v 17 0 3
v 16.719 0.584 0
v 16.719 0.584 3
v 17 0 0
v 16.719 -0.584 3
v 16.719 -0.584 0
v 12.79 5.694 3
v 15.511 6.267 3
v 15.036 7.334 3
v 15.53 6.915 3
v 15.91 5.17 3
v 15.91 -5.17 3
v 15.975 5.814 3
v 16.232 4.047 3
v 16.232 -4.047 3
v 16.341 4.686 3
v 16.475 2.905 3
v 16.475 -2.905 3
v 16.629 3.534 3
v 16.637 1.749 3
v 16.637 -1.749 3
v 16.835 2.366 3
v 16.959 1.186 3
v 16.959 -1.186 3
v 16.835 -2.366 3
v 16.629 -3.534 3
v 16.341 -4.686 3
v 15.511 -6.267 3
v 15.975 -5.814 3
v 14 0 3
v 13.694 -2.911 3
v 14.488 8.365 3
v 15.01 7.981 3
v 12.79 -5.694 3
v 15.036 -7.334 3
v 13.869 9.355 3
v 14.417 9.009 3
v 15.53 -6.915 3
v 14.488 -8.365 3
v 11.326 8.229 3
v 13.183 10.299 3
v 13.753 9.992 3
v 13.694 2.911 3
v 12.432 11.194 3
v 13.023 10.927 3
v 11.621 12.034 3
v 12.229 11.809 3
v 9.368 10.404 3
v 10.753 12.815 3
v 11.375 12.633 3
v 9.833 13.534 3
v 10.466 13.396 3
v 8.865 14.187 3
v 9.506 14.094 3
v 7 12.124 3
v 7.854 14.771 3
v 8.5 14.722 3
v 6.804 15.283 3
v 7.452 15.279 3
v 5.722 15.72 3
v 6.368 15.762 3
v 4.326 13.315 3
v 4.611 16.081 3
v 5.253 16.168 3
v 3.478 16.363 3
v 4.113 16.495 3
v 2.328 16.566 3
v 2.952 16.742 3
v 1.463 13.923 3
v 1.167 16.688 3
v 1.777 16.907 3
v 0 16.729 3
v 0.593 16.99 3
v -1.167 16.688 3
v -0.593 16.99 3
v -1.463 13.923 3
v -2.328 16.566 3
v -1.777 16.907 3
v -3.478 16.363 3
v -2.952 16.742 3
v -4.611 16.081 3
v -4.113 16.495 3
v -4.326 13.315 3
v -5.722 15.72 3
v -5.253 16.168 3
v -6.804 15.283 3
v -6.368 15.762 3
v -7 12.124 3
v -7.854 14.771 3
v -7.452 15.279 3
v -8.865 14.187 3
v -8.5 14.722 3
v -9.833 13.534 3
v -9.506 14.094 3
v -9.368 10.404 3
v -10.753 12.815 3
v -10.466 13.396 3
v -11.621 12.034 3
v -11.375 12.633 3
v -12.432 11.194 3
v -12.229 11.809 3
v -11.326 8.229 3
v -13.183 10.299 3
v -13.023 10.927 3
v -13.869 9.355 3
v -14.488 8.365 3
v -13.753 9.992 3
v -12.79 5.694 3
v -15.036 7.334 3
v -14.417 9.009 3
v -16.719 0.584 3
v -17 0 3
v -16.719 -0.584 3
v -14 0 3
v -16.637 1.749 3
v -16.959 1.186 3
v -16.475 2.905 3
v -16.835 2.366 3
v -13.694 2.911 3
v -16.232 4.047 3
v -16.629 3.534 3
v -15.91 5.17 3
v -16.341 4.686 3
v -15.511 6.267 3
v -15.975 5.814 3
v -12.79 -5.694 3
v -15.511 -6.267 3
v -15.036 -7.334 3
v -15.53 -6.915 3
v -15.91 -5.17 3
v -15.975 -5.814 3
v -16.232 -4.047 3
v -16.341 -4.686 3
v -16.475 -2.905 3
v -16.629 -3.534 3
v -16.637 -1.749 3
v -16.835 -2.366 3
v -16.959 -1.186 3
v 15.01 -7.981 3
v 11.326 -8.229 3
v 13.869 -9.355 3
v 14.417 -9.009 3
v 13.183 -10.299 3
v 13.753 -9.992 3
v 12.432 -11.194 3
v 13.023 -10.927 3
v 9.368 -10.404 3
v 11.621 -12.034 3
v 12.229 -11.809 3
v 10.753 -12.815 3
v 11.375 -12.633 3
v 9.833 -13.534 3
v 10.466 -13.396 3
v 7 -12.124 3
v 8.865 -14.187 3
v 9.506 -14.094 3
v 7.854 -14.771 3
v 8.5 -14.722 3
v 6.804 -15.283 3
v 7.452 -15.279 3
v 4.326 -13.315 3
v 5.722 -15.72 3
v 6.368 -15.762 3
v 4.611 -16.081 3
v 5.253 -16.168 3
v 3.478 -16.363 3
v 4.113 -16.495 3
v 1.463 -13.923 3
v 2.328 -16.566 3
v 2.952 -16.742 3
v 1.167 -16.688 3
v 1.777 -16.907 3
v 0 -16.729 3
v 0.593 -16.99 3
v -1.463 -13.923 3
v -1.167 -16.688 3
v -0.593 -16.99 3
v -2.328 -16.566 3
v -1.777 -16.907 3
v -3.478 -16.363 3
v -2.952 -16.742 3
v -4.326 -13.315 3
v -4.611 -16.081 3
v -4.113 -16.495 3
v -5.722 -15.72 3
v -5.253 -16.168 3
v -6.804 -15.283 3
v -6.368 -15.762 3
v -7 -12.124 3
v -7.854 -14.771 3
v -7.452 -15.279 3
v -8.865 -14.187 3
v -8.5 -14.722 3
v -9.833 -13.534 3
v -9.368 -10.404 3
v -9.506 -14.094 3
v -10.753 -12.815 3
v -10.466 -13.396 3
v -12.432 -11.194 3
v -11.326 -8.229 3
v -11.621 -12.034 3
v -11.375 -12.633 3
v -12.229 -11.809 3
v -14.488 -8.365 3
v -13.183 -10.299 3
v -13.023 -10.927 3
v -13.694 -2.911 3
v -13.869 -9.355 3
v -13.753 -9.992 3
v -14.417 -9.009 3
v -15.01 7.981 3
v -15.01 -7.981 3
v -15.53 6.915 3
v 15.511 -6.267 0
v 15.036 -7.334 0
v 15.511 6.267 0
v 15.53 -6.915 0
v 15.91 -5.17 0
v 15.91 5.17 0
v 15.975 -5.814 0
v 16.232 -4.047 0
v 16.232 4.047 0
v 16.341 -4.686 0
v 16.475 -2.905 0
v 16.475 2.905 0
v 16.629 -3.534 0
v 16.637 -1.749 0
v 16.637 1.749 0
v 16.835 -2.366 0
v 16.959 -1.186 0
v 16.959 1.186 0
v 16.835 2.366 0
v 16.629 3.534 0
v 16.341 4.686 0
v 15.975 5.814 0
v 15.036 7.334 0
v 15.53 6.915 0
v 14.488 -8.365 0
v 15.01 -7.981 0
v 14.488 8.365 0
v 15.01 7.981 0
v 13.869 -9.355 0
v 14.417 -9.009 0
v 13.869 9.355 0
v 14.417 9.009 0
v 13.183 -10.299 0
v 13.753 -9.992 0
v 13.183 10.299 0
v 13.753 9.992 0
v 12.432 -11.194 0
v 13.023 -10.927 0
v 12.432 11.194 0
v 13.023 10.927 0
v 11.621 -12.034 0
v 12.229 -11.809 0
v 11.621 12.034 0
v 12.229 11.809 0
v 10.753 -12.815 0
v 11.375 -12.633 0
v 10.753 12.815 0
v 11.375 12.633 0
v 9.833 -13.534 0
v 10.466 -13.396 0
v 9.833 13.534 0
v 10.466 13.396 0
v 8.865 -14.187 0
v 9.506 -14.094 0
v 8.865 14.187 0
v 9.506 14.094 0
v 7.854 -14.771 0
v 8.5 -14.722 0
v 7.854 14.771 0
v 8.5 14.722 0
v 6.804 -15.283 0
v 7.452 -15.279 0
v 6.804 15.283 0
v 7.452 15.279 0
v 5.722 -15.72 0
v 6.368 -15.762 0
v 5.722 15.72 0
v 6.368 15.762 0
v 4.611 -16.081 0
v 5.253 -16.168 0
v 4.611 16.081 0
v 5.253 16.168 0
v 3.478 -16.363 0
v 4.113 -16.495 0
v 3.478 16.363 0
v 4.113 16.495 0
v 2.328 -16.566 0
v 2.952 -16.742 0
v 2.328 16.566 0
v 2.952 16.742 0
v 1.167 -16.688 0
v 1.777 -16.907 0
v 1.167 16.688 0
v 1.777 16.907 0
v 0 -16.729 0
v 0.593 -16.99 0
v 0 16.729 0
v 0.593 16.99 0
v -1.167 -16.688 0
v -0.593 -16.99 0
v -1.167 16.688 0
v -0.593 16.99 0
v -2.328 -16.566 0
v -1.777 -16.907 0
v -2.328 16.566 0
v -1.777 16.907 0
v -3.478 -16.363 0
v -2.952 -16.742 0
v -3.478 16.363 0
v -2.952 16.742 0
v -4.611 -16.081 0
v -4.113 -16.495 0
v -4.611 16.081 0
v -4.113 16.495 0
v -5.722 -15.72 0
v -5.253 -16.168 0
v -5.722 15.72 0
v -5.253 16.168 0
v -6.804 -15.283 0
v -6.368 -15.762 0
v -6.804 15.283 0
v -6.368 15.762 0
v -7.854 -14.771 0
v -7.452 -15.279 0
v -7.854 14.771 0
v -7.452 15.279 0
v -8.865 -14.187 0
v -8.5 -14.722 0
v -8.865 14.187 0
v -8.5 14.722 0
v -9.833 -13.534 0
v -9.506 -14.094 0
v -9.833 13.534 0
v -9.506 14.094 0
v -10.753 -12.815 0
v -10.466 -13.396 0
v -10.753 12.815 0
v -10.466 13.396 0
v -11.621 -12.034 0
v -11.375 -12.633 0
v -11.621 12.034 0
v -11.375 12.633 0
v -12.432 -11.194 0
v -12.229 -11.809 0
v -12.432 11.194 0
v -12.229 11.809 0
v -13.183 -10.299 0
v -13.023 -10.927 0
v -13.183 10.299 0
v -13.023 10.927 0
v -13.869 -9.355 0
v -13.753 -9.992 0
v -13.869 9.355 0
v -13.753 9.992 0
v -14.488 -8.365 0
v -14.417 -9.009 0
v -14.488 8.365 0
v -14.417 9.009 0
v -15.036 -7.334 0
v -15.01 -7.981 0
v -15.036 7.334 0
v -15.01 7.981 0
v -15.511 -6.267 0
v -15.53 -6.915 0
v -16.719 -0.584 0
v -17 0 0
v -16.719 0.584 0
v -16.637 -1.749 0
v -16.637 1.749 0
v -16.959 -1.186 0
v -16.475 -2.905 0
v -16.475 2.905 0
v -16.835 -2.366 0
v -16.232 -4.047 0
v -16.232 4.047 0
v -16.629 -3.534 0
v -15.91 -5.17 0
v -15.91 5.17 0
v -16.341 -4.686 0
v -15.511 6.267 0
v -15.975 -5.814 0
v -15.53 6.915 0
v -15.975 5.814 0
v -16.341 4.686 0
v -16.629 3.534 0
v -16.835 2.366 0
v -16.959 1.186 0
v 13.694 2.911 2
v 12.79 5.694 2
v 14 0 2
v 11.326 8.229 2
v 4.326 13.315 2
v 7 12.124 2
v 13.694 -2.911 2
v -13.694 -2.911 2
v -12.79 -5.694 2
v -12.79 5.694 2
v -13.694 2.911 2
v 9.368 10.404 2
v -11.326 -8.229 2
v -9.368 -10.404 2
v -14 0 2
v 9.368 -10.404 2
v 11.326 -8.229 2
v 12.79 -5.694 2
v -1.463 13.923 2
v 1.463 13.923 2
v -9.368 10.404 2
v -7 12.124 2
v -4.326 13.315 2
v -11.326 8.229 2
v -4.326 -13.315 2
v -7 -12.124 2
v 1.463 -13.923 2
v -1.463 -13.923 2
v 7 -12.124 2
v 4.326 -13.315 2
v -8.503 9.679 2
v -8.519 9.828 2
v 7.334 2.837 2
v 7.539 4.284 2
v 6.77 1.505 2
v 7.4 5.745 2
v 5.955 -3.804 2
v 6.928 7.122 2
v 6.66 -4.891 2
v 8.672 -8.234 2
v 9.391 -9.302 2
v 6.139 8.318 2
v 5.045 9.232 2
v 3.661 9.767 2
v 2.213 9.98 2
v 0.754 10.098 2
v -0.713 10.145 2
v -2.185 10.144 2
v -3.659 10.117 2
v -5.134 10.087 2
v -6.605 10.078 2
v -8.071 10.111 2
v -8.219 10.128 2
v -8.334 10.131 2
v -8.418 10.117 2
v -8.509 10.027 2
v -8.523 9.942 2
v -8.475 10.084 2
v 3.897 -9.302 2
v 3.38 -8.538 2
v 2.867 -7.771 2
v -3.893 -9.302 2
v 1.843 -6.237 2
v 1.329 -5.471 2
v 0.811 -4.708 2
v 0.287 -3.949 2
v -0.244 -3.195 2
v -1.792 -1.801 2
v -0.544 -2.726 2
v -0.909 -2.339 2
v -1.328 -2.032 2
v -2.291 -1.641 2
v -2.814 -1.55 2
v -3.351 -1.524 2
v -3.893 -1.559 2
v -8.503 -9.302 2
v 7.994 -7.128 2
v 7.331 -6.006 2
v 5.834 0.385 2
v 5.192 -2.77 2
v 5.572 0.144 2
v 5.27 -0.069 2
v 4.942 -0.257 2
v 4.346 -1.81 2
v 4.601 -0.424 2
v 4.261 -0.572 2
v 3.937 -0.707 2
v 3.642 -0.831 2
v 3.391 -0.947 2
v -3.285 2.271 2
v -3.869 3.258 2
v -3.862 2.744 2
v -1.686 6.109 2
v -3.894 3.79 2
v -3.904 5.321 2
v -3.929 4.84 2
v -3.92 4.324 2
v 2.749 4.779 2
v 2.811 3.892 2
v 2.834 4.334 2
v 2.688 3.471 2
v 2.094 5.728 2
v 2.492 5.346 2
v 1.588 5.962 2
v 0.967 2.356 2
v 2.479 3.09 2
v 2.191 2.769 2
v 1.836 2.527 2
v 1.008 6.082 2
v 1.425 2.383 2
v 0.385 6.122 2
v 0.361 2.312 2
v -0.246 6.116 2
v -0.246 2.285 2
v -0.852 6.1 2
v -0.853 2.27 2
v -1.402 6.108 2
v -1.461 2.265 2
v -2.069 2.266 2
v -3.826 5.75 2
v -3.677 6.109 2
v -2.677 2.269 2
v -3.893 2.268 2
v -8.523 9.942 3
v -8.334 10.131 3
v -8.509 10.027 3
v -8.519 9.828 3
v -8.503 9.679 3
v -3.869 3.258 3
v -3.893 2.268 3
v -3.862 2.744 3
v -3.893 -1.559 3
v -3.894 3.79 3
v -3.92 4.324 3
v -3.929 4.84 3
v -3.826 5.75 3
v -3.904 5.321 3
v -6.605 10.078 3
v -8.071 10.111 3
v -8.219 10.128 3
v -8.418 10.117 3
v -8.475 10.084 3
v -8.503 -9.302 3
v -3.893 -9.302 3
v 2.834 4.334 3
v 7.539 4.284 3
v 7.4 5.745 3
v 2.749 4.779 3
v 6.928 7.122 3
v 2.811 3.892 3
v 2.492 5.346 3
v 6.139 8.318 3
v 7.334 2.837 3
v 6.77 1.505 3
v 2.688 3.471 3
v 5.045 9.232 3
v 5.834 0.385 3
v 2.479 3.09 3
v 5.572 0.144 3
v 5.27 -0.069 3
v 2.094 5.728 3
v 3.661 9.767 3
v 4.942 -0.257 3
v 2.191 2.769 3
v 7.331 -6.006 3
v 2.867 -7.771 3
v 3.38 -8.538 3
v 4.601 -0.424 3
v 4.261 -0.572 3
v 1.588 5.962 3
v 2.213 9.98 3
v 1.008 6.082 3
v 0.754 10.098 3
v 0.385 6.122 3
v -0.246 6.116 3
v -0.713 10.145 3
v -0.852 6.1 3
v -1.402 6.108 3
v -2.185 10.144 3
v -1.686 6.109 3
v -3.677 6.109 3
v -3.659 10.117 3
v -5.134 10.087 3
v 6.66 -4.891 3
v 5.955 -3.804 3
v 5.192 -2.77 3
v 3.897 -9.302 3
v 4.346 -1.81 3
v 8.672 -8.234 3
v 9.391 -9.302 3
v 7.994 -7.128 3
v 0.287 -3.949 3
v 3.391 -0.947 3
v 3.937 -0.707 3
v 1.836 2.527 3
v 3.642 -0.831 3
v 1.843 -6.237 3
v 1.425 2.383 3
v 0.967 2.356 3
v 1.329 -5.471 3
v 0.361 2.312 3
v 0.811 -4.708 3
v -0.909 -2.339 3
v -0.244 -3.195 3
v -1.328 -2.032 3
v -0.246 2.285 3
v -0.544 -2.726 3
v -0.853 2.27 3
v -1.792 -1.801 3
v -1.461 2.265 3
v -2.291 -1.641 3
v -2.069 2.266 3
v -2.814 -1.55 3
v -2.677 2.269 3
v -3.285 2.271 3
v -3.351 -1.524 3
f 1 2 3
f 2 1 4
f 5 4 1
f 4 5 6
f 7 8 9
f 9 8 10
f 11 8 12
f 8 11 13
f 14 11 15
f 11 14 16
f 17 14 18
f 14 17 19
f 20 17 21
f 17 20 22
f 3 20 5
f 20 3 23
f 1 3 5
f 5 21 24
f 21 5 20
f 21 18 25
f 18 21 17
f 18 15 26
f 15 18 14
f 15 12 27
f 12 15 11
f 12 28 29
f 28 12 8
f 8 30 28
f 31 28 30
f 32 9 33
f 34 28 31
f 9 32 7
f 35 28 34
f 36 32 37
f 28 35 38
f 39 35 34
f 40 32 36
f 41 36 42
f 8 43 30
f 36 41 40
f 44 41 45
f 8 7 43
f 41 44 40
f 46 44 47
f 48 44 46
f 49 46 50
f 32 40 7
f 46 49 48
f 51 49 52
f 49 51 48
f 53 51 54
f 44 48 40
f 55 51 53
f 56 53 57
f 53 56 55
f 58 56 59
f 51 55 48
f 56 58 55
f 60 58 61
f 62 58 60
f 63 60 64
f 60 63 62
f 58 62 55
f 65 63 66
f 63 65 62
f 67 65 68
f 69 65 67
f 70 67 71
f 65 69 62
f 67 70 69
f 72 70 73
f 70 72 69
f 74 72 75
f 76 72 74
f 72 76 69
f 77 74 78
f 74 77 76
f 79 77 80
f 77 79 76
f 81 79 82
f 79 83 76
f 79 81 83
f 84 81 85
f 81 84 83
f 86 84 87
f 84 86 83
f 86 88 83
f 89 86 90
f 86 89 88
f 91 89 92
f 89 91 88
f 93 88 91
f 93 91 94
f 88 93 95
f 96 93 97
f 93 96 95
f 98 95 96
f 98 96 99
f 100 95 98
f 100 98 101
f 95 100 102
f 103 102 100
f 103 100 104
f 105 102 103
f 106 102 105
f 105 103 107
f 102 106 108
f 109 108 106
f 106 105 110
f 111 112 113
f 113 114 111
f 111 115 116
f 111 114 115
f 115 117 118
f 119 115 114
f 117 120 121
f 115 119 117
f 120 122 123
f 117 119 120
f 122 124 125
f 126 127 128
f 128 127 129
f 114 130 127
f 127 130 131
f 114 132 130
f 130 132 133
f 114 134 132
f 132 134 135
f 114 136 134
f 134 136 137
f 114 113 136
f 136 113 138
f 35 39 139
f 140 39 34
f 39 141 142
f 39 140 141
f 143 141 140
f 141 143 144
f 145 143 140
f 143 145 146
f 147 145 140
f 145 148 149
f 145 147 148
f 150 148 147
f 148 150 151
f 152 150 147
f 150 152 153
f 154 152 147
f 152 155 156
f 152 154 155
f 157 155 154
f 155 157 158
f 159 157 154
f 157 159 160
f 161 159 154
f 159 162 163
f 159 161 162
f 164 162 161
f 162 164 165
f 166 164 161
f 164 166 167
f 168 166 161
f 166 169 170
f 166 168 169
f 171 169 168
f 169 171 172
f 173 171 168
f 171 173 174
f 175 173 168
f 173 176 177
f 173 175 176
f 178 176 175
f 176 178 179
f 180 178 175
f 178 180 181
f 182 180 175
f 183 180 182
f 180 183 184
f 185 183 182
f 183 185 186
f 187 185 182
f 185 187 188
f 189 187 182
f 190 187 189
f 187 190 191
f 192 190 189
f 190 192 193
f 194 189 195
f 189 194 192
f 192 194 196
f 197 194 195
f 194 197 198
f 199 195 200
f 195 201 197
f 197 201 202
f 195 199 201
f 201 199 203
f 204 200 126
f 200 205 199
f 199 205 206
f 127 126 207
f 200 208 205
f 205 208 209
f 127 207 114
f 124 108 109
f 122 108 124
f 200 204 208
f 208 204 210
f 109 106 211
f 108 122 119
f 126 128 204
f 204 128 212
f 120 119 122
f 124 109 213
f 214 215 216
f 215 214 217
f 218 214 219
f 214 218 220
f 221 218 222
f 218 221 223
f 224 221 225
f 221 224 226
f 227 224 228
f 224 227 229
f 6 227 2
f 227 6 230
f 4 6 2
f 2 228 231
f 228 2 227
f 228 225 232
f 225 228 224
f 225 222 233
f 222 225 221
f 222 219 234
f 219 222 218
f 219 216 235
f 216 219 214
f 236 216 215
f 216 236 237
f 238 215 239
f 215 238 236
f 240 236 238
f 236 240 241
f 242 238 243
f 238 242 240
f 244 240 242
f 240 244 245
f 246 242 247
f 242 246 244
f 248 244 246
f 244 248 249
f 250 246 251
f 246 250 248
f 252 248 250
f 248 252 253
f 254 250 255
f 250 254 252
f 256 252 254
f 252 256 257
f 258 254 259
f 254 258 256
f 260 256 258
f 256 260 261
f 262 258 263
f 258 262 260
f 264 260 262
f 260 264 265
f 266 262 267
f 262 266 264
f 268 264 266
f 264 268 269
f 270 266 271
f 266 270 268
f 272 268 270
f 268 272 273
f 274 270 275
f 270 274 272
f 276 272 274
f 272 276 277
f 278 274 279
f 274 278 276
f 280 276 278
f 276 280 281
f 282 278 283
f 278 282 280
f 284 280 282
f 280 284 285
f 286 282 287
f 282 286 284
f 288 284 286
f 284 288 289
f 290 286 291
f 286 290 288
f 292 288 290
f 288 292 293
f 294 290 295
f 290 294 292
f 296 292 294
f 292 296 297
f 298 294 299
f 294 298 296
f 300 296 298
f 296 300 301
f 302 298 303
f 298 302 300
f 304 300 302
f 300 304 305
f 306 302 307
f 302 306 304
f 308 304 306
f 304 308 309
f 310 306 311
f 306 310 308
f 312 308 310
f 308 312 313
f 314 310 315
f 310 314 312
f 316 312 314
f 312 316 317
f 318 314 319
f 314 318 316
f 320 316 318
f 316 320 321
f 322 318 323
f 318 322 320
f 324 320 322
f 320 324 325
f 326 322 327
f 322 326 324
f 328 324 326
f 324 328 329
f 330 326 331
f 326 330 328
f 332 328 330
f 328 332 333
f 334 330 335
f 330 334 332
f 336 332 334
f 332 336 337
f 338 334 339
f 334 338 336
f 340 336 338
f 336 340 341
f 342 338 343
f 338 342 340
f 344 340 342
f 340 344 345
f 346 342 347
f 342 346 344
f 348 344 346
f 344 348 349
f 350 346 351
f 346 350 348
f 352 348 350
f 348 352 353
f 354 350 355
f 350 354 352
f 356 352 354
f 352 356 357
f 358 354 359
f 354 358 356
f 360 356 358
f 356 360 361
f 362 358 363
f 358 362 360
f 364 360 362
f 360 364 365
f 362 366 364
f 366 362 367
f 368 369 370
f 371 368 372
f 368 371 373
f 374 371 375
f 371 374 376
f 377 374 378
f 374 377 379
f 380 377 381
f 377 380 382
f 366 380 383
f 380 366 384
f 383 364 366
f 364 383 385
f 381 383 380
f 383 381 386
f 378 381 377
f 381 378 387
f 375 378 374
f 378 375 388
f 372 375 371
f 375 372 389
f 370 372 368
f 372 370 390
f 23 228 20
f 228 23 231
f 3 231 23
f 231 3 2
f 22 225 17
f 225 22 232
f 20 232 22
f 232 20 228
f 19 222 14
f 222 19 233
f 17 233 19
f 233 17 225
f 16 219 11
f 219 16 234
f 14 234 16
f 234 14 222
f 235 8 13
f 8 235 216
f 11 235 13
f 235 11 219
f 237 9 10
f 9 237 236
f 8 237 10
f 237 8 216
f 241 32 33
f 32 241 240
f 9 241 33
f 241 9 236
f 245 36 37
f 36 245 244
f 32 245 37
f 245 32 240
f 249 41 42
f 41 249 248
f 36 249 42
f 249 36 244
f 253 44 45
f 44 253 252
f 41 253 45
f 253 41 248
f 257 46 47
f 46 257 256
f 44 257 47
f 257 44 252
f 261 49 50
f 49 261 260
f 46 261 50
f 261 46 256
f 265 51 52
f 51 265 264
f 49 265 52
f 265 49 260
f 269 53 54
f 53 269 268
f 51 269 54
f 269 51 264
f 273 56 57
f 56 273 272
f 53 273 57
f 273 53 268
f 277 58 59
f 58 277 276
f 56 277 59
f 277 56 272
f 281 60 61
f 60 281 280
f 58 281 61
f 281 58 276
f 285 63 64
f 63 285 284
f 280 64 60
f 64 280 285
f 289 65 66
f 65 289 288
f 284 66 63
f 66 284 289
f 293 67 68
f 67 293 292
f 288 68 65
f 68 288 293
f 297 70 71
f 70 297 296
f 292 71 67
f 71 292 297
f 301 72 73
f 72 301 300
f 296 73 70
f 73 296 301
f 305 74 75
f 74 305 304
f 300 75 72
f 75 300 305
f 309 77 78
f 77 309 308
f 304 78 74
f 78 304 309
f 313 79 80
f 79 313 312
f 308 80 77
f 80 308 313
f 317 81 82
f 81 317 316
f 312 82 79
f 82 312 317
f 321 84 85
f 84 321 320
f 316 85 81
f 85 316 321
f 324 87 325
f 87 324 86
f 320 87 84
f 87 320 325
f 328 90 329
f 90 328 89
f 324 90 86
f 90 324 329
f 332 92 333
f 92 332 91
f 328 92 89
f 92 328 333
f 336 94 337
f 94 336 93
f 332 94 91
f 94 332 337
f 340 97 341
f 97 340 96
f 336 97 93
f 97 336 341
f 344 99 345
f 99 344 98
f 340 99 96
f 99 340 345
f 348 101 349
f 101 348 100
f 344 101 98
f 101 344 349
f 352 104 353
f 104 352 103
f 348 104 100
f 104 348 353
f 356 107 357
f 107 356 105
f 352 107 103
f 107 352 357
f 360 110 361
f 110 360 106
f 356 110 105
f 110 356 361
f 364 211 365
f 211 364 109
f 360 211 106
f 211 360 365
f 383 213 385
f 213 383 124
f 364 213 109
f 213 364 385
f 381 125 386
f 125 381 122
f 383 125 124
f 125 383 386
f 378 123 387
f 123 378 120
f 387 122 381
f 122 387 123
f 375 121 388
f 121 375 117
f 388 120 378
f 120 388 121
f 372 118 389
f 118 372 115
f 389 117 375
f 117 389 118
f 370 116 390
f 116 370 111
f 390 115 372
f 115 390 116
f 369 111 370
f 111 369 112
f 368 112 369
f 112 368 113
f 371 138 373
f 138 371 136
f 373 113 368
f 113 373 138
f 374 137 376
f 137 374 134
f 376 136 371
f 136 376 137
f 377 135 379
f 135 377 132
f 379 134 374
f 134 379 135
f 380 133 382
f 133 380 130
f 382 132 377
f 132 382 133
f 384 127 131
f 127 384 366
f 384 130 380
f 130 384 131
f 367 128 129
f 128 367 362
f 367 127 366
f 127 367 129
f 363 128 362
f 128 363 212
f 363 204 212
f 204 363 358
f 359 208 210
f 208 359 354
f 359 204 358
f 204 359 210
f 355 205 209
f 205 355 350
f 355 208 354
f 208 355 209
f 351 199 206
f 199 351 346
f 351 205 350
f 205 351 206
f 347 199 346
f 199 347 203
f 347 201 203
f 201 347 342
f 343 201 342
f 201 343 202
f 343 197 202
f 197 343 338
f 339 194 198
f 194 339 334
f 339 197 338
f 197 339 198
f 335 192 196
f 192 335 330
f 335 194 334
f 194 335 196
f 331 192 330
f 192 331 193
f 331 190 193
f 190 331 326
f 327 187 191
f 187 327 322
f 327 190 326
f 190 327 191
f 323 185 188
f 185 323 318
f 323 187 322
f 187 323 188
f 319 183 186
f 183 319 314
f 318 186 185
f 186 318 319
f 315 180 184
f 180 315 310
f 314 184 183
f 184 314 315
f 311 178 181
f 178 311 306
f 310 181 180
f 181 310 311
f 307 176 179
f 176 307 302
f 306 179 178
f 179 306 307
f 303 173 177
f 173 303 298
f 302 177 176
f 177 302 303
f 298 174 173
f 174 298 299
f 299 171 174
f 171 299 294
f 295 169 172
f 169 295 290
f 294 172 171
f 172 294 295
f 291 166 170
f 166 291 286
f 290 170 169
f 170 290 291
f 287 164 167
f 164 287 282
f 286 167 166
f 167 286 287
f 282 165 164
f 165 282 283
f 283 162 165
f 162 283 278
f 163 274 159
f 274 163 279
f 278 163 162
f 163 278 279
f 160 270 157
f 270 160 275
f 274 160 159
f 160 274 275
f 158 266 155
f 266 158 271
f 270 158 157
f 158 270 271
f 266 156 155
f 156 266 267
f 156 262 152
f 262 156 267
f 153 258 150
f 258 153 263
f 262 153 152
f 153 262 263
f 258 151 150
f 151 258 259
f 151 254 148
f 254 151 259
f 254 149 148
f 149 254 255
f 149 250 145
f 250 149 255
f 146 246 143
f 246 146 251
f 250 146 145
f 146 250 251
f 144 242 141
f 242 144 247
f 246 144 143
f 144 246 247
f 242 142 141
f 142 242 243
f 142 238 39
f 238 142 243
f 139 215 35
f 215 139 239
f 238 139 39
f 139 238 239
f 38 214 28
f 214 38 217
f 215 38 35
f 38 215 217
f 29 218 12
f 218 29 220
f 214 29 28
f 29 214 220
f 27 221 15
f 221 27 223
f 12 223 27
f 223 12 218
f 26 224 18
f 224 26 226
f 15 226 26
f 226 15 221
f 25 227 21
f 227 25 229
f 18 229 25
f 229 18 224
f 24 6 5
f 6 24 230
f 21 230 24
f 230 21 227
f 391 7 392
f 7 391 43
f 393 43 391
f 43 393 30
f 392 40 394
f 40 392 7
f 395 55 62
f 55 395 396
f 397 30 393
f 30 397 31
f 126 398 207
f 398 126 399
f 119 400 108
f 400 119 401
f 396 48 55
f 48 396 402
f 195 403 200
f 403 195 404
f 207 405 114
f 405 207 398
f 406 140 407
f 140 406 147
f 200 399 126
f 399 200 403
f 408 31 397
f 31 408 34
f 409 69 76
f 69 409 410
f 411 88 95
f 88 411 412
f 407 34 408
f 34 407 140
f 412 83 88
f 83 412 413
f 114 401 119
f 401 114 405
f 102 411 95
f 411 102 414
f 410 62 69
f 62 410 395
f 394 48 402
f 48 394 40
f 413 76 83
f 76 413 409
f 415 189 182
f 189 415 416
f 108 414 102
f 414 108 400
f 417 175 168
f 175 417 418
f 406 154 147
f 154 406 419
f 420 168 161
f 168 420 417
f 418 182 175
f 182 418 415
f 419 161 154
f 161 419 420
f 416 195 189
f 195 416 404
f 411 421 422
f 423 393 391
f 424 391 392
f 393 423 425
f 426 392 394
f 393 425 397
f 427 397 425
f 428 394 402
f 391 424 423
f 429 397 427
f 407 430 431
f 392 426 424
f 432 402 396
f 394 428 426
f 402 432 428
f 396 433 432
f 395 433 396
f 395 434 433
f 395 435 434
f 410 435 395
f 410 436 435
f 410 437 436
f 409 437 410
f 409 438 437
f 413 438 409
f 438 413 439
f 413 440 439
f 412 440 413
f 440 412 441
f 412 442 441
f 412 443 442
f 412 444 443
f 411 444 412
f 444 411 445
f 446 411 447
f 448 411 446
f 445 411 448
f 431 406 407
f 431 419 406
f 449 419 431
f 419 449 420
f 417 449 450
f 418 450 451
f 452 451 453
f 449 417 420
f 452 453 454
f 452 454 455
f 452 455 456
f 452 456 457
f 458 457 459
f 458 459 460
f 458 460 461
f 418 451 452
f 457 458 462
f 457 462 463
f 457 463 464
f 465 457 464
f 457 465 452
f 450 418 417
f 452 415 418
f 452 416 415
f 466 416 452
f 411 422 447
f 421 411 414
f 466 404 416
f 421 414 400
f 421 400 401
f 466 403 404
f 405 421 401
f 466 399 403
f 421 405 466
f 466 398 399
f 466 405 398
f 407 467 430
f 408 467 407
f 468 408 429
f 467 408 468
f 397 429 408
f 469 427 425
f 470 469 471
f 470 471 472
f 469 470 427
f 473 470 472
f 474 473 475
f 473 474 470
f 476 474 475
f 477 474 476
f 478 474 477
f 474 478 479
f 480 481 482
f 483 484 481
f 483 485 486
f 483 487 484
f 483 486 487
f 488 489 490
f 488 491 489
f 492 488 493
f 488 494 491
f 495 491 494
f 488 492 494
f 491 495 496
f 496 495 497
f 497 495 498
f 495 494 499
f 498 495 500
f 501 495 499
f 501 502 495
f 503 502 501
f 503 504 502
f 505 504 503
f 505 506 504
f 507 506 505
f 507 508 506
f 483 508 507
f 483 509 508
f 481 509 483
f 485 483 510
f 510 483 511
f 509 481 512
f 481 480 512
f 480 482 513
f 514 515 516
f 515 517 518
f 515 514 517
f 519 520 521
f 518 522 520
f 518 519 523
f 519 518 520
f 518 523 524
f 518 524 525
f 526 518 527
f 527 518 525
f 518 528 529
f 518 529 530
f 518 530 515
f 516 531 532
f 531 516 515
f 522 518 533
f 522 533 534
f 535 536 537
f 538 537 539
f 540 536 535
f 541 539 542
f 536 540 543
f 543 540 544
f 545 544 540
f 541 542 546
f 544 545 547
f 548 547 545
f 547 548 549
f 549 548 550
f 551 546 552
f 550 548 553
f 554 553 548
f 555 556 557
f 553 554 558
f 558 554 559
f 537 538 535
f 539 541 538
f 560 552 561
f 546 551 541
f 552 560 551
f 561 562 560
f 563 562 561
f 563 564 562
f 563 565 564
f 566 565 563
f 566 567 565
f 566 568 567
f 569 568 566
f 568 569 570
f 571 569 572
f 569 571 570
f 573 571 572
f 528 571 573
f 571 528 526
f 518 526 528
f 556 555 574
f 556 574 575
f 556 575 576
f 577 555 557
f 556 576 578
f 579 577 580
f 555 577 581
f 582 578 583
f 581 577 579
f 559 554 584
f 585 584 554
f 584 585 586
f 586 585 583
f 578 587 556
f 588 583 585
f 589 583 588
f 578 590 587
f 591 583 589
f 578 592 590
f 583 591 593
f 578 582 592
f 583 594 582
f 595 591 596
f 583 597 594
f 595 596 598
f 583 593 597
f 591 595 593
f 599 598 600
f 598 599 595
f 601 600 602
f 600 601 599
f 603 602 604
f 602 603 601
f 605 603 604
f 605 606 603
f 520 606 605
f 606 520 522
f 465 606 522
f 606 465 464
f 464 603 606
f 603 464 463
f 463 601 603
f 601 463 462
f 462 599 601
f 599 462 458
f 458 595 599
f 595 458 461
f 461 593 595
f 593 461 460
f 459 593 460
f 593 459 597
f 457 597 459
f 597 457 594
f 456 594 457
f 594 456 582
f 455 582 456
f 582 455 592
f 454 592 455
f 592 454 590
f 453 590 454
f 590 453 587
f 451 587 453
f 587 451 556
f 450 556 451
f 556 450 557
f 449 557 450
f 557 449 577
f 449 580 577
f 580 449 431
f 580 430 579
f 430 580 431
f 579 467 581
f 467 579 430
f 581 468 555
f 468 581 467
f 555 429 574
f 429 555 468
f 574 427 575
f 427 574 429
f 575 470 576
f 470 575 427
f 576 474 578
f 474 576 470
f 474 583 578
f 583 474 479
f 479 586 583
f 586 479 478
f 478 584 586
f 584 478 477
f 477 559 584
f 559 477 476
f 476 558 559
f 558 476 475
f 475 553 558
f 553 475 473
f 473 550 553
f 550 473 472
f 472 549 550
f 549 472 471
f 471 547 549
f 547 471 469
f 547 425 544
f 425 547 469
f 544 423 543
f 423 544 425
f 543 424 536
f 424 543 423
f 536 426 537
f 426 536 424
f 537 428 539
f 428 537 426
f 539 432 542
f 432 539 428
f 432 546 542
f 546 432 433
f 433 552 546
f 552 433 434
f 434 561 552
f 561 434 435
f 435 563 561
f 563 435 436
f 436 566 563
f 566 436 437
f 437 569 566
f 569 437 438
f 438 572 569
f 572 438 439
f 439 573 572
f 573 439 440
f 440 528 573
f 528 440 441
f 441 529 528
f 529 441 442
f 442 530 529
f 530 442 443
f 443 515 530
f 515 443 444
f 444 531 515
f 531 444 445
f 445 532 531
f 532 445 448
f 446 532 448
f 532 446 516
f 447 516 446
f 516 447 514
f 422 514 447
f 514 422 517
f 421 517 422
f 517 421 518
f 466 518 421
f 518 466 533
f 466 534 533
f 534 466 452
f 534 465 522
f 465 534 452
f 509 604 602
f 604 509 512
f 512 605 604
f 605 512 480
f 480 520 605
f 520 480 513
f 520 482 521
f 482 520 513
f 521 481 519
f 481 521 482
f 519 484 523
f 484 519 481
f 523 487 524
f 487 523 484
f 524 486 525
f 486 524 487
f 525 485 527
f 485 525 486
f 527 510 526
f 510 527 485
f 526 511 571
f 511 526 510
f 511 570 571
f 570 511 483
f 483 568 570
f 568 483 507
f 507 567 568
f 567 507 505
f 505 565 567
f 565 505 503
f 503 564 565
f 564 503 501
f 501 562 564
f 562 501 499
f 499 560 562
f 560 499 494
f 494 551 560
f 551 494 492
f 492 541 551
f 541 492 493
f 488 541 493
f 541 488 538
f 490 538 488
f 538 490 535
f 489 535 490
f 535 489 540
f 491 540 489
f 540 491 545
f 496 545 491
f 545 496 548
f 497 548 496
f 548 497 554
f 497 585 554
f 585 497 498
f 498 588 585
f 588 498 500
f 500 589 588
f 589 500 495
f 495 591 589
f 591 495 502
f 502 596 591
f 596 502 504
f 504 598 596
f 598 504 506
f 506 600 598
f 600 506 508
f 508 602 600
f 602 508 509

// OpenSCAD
// file: coin-lib.scad
/*
 * Simple coin shape
 *
 * Copyright (c) 2012 Mark Hindess
 *
 * Creative Commons Attribution-NonCommercial-ShareAlike 3.0 Unported License:
 *
 *   http://creativecommons.org/licenses/by-nc-sa/3.0/
 */

module coin(height = 3, radius = 17,
            cut_radius = 14, cut_height = 1,
            bumps = 90, bump_radius = 2) {
  deg = 360/bumps;
  difference() {
    union() {
      for(n=[0:bumps-1]) {
        rotate([0, 0, n*deg])
          translate([radius-bump_radius, 0, 0])
            cylinder(r = bump_radius, h = height);
      }
      cylinder(r = radius-bump_radius, h = height);
    }
    translate([0, 0, height-cut_height])
      cylinder(r = cut_radius, h = height-cut_height);
  }
}

coin();
// main file
use <coin-lib.scad>
coin();
translate([-11.5,-11,2])
  scale([0.27,0.27,1])
    linear_extrude(file = "r.dxf", height = 2, center = true);
